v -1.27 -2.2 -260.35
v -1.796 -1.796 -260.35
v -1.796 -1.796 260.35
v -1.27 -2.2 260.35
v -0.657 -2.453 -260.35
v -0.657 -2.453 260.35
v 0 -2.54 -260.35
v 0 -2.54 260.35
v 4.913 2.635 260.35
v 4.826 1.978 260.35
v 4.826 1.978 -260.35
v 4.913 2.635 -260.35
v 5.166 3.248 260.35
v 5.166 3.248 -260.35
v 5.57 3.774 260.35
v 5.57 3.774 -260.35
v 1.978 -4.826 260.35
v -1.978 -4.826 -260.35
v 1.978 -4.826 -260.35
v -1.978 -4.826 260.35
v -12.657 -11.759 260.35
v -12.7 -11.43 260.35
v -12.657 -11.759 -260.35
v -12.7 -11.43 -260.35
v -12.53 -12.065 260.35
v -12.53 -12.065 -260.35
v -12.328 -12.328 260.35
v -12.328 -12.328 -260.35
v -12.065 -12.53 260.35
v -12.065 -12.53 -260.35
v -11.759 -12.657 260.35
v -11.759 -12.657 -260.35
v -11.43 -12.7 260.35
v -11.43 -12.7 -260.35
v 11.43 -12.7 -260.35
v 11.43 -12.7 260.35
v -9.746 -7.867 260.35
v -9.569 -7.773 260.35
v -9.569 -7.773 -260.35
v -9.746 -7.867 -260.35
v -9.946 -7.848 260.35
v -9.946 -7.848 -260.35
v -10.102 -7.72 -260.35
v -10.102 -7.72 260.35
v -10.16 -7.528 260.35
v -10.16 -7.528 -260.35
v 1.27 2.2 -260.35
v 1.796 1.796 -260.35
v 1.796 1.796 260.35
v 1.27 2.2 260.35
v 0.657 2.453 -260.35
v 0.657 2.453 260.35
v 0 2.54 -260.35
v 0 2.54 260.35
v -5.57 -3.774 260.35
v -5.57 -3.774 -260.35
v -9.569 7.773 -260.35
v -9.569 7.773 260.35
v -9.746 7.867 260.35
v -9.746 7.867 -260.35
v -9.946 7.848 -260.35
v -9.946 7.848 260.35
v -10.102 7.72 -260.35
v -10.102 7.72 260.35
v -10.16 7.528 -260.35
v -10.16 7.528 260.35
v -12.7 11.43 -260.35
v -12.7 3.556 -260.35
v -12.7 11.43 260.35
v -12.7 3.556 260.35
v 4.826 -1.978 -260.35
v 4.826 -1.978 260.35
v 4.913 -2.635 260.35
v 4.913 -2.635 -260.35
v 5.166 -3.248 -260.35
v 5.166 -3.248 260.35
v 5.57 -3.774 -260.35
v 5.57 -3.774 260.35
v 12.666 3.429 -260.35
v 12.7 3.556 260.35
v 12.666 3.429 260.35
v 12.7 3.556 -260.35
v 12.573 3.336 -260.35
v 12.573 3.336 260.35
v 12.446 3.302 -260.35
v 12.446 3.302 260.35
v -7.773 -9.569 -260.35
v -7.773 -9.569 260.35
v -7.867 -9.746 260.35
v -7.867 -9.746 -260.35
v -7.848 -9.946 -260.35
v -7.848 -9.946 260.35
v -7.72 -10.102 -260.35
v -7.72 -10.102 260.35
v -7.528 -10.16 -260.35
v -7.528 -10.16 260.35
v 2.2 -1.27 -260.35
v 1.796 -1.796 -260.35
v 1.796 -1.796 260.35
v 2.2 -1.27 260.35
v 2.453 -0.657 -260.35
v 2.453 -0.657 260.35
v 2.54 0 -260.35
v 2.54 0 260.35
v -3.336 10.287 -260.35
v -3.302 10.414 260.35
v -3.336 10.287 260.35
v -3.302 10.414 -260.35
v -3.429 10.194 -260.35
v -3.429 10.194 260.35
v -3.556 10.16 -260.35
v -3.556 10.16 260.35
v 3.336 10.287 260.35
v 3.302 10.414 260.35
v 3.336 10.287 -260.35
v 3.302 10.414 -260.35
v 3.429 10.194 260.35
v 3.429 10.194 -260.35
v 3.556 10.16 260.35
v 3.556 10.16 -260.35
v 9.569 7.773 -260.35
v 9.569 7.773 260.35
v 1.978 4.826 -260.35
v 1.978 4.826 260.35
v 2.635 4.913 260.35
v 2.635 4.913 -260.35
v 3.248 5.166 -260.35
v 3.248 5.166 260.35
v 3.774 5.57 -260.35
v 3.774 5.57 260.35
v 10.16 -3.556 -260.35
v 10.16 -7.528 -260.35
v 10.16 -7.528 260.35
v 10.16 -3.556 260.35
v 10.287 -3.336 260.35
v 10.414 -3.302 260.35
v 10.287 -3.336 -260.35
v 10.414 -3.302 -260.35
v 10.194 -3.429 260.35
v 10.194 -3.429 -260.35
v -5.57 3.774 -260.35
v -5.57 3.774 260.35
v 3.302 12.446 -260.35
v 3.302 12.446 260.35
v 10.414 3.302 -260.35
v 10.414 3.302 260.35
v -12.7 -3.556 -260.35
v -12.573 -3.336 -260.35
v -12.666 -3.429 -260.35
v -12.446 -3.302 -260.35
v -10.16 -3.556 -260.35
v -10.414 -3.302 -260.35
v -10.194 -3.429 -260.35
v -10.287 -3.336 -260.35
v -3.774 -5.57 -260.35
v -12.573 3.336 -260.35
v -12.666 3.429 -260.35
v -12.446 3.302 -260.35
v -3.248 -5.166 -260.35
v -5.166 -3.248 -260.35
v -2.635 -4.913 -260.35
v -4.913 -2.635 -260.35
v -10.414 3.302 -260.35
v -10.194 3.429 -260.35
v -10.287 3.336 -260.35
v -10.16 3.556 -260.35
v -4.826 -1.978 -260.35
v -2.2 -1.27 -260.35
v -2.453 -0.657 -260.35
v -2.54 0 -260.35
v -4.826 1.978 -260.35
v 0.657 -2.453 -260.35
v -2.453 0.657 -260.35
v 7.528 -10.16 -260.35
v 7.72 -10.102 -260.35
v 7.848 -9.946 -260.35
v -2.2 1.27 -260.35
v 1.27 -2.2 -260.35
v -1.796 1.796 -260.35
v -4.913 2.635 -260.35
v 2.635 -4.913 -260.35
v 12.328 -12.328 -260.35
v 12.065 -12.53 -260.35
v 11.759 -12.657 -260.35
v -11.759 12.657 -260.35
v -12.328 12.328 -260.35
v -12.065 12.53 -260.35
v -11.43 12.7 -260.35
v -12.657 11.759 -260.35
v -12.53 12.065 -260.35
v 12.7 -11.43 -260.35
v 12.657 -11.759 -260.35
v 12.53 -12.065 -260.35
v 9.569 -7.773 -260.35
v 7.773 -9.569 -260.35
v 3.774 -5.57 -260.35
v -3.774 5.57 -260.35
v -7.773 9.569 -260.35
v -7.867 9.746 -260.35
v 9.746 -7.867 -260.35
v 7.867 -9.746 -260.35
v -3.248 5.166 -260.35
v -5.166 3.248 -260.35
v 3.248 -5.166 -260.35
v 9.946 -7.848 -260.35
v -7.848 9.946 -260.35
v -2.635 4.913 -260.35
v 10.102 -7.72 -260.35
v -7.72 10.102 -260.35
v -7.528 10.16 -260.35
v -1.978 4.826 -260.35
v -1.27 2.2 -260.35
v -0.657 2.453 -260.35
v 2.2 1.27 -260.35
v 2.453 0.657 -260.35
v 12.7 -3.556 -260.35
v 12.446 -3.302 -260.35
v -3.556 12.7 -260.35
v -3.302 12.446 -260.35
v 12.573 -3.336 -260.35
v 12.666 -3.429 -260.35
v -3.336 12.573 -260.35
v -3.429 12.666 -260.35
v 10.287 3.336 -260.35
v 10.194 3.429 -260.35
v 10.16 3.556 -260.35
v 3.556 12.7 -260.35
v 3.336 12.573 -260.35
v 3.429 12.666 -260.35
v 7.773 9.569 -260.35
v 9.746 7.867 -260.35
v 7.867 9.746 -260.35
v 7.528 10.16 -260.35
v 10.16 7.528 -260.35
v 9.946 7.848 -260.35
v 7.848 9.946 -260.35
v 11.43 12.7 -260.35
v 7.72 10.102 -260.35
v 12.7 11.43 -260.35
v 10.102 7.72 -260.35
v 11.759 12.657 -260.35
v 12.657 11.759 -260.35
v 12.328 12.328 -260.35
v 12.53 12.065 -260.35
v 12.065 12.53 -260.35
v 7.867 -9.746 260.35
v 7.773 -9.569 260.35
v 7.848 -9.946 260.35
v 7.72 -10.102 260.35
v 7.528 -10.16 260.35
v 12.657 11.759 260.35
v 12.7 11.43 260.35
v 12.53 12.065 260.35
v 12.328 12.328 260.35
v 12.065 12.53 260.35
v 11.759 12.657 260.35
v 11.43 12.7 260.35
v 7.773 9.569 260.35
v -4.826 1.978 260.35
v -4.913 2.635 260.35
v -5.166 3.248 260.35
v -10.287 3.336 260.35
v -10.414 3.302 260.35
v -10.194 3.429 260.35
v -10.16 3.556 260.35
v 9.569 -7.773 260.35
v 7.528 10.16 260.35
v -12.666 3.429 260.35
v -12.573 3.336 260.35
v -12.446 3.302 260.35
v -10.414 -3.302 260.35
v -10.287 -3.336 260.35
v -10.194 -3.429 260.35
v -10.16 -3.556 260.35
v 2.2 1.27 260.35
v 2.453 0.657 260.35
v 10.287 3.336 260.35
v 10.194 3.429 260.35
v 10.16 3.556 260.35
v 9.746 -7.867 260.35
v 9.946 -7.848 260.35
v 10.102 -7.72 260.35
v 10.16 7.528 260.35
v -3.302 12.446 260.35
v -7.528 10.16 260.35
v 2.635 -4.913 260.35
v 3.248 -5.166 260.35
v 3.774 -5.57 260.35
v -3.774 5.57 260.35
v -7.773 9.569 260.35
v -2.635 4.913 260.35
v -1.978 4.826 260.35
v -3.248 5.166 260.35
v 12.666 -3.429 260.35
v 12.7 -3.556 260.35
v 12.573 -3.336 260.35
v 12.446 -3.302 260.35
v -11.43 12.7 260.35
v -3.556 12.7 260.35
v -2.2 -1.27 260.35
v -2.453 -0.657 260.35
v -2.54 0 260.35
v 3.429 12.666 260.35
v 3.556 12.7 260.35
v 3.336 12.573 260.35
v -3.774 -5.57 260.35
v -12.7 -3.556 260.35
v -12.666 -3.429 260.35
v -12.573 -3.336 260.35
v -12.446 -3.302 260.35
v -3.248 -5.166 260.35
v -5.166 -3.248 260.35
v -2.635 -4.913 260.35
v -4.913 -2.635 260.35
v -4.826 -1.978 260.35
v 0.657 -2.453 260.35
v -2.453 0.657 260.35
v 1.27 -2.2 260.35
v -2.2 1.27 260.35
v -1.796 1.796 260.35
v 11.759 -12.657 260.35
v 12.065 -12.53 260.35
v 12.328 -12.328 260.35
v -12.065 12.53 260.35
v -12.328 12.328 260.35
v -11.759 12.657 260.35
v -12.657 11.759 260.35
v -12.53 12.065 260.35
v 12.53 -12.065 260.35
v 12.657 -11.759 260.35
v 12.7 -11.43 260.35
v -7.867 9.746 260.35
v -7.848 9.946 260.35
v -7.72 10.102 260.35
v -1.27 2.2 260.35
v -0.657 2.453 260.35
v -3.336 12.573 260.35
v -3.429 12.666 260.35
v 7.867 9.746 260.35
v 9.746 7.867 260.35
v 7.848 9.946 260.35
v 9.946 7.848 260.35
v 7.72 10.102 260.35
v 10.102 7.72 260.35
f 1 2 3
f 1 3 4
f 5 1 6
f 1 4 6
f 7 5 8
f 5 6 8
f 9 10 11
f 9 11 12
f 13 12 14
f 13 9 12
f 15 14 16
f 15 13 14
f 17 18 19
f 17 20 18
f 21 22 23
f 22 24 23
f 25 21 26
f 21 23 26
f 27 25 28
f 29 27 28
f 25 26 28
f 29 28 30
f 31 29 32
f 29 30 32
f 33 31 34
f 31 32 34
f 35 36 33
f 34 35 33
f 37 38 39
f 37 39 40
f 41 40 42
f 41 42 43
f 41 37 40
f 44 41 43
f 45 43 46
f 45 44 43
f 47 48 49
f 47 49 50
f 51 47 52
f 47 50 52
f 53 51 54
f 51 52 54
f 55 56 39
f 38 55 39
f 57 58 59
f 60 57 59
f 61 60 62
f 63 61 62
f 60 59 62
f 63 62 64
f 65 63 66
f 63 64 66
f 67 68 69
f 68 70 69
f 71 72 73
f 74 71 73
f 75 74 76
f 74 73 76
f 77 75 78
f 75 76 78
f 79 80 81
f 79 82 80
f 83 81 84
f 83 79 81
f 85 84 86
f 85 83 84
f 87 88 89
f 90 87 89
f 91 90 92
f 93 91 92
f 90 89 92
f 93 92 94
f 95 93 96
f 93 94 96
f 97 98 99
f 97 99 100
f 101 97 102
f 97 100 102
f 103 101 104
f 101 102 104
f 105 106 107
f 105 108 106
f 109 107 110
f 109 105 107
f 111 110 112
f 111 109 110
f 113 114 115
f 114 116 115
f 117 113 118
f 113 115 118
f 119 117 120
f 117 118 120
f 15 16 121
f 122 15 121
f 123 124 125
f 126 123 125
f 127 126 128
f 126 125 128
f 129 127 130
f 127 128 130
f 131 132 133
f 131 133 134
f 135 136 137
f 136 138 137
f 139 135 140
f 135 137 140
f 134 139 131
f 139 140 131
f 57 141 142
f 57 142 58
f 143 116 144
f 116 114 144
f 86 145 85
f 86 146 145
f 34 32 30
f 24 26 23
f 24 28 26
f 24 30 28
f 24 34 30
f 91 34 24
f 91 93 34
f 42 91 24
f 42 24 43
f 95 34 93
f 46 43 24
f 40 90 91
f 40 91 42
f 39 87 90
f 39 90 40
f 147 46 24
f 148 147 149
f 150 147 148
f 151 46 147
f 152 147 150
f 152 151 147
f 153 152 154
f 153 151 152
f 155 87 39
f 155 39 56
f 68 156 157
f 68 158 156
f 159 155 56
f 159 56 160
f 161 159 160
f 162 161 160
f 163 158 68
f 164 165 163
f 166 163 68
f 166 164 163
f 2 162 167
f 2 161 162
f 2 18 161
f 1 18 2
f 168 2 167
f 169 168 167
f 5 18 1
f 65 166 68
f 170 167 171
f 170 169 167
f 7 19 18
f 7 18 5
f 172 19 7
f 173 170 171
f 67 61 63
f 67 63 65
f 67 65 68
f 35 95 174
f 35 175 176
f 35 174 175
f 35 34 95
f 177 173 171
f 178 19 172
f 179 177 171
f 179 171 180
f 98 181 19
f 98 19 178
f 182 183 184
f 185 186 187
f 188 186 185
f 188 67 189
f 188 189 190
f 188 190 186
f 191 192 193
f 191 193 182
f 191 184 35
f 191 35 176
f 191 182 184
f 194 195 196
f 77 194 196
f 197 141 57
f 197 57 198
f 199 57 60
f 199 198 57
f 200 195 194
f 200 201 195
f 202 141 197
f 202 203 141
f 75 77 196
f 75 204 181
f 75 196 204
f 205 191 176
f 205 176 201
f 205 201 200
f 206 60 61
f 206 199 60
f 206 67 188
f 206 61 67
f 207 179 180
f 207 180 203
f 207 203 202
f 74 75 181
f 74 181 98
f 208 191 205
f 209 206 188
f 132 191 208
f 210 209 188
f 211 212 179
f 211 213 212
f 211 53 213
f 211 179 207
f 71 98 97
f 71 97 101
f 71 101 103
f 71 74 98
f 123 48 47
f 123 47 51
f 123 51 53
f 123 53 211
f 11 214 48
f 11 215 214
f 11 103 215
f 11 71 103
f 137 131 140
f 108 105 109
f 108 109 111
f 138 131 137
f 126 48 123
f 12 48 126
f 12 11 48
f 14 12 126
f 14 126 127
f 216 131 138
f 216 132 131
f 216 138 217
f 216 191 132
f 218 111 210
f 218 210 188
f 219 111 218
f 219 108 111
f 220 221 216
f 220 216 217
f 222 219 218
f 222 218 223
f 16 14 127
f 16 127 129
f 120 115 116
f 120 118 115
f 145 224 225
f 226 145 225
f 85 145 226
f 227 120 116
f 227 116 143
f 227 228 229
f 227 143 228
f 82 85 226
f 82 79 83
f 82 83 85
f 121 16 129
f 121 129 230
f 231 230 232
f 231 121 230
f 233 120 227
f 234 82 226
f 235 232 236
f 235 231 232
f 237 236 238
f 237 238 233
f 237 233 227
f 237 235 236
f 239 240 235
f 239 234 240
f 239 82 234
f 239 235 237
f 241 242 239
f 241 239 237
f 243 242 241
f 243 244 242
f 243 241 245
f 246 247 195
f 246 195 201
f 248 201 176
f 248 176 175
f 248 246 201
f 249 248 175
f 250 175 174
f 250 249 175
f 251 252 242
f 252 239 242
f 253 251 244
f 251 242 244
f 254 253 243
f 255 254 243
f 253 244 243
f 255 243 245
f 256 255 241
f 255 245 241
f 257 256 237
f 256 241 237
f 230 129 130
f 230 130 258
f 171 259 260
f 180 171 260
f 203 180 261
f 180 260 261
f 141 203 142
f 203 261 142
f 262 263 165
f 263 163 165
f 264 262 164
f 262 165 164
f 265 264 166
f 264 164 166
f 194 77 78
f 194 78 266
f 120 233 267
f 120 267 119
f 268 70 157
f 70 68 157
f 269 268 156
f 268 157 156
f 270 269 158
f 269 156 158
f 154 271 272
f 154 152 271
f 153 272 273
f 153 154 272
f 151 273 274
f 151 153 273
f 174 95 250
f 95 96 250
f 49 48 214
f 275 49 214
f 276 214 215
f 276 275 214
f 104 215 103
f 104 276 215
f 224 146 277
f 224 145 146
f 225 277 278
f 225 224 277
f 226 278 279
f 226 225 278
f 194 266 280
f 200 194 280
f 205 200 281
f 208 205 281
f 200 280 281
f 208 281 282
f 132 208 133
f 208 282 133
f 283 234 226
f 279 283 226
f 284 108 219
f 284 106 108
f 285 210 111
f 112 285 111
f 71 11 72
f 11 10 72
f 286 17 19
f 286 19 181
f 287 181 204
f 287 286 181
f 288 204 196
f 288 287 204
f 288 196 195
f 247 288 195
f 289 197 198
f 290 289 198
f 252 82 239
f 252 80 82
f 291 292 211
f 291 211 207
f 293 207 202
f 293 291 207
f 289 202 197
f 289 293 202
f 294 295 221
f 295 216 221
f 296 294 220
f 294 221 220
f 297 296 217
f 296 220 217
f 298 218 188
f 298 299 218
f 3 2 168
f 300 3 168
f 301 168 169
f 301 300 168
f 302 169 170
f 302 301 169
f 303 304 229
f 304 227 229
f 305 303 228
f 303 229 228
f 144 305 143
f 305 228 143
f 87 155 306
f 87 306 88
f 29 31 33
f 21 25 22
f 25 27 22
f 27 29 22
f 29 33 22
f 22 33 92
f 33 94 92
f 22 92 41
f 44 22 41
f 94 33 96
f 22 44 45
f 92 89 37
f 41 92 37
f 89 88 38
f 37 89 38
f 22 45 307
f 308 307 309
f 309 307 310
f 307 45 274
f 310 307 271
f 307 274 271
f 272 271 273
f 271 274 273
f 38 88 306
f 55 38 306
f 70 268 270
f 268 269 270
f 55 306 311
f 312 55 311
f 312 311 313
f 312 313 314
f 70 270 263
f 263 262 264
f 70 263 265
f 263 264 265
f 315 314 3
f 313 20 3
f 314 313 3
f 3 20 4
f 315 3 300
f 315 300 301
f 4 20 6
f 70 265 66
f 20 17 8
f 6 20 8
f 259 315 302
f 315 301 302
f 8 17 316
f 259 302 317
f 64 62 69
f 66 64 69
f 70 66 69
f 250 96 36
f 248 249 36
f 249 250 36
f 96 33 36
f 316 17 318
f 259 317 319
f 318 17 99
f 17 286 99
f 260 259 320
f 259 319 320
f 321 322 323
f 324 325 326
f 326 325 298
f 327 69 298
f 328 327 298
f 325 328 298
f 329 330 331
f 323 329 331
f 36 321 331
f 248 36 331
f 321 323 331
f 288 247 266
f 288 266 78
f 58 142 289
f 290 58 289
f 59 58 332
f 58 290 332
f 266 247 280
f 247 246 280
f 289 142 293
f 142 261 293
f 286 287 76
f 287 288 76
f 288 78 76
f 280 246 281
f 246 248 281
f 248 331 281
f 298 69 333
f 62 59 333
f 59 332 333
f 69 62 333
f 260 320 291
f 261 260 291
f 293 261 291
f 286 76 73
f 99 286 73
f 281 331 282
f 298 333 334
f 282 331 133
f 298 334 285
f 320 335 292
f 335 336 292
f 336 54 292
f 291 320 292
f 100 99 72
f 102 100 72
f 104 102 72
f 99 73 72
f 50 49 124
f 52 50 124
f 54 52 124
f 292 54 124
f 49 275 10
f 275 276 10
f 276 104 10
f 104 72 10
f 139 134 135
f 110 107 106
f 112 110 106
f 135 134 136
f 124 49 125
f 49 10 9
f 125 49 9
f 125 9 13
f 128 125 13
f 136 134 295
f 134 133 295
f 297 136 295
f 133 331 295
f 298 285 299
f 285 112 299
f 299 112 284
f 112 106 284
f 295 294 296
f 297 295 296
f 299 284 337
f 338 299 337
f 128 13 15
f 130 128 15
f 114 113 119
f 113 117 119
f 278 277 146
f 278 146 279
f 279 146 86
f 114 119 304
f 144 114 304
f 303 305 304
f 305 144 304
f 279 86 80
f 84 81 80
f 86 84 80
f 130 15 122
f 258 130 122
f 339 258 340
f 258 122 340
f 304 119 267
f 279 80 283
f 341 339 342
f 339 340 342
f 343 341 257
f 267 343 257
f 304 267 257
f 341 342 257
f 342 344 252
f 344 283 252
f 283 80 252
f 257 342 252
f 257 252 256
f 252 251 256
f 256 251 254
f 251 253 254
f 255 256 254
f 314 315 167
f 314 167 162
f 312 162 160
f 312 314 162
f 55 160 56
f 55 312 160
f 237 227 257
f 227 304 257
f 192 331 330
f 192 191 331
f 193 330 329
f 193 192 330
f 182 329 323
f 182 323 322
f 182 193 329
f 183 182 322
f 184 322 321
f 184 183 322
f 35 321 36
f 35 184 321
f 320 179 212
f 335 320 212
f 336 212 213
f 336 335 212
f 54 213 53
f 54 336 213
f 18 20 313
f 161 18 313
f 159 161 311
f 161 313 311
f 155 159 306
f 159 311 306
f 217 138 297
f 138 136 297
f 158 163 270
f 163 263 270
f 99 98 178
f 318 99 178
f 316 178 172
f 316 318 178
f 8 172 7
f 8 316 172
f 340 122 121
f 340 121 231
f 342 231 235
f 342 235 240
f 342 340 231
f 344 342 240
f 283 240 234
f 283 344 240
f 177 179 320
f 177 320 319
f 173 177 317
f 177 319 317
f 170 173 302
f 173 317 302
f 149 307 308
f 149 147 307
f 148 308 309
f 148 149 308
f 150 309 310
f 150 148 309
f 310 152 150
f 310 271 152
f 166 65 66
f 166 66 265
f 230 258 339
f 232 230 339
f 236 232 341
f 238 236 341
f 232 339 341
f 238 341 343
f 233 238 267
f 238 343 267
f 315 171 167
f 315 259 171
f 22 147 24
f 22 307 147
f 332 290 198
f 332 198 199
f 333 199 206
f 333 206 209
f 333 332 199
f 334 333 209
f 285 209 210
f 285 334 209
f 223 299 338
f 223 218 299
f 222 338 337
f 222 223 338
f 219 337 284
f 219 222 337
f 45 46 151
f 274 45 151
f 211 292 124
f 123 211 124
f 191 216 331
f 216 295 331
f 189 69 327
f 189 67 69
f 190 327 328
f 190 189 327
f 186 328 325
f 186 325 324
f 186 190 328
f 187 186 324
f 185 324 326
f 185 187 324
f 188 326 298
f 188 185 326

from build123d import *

# Parameters (mm, degrees)
BOSS_EXTRUDE1_DEPTH = 260.35
FILLET2_R           = 0.254
FILLET1_R           = 1.27
SKETCH5_W           = 7.112
SKETCH5_H           = 2.54
BOSS_EXTRUDE2_DEPTH = 520.7


with BuildPart() as part:
    # Sketch3 → Boss-Extrude1 (new body, symmetric)
    with BuildSketch(Plane.XY):
        with BuildLine():
            Line((-12.7, 12.7), (-1.796051224, 1.796051224))
            ThreePointArc((-1.796051224, 1.796051224), (-0.972015918, 2.346654013), (0, 2.54))
            Line((0, 2.54), (0, 4.826))
            Line((0, 4.826), (-1.977846327, 4.826))
            ThreePointArc((-1.977846327, 4.826), (-2.949862246, 5.019345987), (-3.773897552, 5.569948776))
            Line((-3.773897552, 5.569948776), (-7.772528286, 9.56857951))
            ThreePointArc((-7.772528286, 9.56857951), (-7.847628361, 9.946133082), (-7.527553898, 10.16))
            Line((-7.527553898, 10.16), (-3.302, 10.16))
            Line((-3.302, 10.16), (-3.302, 12.7))
            Line((-3.302, 12.7), (-12.7, 12.7))
        make_face()
    extrude(amount=BOSS_EXTRUDE1_DEPTH, both=True)

    # Fillet2
    fillet2_edges = [part.edges().sort_by_distance(p)[0] for p in [
        (-3.302, 12.7, 0),
        (-3.302, 10.16, 0),
    ]]
    fillet(fillet2_edges, radius=FILLET2_R)

    # Mirror1: part across plane


with BuildPart() as part_1:
    add(part.part)
    add(part.part.mirror(Plane(origin=(0, 0, 260.35), x_dir=(0, 0, 1), z_dir=(0.707106781, 0.707106781, 0))))

    # Fillet1
    fillet1_edges = [part_1.edges().sort_by_distance(p)[0] for p in [
        (-12.7, 12.7, 0),
    ]]
    fillet(fillet1_edges, radius=FILLET1_R)

    # Mirror2: part across plane


with BuildPart() as part_2:
    add(part_1.part)
    add(part_1.part.mirror(Plane(origin=(0, 0, 260.35), x_dir=(0, 0, 1), z_dir=(0, 1, 0))))

    # Mirror5: part across plane


with BuildPart() as part_3:
    add(part_2.part)
    add(part_2.part.mirror(Plane(origin=(0, 0, 260.35), x_dir=(0, 0, 1), z_dir=(-1, 0, 0))))

    # Sketch5 → Boss-Extrude2 (add, through all)
    with BuildSketch(Plane.XY.offset(260.35)):
        with Locations((0, -11.43)):
            Rectangle(SKETCH5_W, SKETCH5_H)
    extrude(amount=-BOSS_EXTRUDE2_DEPTH)


solid = part_3.part
